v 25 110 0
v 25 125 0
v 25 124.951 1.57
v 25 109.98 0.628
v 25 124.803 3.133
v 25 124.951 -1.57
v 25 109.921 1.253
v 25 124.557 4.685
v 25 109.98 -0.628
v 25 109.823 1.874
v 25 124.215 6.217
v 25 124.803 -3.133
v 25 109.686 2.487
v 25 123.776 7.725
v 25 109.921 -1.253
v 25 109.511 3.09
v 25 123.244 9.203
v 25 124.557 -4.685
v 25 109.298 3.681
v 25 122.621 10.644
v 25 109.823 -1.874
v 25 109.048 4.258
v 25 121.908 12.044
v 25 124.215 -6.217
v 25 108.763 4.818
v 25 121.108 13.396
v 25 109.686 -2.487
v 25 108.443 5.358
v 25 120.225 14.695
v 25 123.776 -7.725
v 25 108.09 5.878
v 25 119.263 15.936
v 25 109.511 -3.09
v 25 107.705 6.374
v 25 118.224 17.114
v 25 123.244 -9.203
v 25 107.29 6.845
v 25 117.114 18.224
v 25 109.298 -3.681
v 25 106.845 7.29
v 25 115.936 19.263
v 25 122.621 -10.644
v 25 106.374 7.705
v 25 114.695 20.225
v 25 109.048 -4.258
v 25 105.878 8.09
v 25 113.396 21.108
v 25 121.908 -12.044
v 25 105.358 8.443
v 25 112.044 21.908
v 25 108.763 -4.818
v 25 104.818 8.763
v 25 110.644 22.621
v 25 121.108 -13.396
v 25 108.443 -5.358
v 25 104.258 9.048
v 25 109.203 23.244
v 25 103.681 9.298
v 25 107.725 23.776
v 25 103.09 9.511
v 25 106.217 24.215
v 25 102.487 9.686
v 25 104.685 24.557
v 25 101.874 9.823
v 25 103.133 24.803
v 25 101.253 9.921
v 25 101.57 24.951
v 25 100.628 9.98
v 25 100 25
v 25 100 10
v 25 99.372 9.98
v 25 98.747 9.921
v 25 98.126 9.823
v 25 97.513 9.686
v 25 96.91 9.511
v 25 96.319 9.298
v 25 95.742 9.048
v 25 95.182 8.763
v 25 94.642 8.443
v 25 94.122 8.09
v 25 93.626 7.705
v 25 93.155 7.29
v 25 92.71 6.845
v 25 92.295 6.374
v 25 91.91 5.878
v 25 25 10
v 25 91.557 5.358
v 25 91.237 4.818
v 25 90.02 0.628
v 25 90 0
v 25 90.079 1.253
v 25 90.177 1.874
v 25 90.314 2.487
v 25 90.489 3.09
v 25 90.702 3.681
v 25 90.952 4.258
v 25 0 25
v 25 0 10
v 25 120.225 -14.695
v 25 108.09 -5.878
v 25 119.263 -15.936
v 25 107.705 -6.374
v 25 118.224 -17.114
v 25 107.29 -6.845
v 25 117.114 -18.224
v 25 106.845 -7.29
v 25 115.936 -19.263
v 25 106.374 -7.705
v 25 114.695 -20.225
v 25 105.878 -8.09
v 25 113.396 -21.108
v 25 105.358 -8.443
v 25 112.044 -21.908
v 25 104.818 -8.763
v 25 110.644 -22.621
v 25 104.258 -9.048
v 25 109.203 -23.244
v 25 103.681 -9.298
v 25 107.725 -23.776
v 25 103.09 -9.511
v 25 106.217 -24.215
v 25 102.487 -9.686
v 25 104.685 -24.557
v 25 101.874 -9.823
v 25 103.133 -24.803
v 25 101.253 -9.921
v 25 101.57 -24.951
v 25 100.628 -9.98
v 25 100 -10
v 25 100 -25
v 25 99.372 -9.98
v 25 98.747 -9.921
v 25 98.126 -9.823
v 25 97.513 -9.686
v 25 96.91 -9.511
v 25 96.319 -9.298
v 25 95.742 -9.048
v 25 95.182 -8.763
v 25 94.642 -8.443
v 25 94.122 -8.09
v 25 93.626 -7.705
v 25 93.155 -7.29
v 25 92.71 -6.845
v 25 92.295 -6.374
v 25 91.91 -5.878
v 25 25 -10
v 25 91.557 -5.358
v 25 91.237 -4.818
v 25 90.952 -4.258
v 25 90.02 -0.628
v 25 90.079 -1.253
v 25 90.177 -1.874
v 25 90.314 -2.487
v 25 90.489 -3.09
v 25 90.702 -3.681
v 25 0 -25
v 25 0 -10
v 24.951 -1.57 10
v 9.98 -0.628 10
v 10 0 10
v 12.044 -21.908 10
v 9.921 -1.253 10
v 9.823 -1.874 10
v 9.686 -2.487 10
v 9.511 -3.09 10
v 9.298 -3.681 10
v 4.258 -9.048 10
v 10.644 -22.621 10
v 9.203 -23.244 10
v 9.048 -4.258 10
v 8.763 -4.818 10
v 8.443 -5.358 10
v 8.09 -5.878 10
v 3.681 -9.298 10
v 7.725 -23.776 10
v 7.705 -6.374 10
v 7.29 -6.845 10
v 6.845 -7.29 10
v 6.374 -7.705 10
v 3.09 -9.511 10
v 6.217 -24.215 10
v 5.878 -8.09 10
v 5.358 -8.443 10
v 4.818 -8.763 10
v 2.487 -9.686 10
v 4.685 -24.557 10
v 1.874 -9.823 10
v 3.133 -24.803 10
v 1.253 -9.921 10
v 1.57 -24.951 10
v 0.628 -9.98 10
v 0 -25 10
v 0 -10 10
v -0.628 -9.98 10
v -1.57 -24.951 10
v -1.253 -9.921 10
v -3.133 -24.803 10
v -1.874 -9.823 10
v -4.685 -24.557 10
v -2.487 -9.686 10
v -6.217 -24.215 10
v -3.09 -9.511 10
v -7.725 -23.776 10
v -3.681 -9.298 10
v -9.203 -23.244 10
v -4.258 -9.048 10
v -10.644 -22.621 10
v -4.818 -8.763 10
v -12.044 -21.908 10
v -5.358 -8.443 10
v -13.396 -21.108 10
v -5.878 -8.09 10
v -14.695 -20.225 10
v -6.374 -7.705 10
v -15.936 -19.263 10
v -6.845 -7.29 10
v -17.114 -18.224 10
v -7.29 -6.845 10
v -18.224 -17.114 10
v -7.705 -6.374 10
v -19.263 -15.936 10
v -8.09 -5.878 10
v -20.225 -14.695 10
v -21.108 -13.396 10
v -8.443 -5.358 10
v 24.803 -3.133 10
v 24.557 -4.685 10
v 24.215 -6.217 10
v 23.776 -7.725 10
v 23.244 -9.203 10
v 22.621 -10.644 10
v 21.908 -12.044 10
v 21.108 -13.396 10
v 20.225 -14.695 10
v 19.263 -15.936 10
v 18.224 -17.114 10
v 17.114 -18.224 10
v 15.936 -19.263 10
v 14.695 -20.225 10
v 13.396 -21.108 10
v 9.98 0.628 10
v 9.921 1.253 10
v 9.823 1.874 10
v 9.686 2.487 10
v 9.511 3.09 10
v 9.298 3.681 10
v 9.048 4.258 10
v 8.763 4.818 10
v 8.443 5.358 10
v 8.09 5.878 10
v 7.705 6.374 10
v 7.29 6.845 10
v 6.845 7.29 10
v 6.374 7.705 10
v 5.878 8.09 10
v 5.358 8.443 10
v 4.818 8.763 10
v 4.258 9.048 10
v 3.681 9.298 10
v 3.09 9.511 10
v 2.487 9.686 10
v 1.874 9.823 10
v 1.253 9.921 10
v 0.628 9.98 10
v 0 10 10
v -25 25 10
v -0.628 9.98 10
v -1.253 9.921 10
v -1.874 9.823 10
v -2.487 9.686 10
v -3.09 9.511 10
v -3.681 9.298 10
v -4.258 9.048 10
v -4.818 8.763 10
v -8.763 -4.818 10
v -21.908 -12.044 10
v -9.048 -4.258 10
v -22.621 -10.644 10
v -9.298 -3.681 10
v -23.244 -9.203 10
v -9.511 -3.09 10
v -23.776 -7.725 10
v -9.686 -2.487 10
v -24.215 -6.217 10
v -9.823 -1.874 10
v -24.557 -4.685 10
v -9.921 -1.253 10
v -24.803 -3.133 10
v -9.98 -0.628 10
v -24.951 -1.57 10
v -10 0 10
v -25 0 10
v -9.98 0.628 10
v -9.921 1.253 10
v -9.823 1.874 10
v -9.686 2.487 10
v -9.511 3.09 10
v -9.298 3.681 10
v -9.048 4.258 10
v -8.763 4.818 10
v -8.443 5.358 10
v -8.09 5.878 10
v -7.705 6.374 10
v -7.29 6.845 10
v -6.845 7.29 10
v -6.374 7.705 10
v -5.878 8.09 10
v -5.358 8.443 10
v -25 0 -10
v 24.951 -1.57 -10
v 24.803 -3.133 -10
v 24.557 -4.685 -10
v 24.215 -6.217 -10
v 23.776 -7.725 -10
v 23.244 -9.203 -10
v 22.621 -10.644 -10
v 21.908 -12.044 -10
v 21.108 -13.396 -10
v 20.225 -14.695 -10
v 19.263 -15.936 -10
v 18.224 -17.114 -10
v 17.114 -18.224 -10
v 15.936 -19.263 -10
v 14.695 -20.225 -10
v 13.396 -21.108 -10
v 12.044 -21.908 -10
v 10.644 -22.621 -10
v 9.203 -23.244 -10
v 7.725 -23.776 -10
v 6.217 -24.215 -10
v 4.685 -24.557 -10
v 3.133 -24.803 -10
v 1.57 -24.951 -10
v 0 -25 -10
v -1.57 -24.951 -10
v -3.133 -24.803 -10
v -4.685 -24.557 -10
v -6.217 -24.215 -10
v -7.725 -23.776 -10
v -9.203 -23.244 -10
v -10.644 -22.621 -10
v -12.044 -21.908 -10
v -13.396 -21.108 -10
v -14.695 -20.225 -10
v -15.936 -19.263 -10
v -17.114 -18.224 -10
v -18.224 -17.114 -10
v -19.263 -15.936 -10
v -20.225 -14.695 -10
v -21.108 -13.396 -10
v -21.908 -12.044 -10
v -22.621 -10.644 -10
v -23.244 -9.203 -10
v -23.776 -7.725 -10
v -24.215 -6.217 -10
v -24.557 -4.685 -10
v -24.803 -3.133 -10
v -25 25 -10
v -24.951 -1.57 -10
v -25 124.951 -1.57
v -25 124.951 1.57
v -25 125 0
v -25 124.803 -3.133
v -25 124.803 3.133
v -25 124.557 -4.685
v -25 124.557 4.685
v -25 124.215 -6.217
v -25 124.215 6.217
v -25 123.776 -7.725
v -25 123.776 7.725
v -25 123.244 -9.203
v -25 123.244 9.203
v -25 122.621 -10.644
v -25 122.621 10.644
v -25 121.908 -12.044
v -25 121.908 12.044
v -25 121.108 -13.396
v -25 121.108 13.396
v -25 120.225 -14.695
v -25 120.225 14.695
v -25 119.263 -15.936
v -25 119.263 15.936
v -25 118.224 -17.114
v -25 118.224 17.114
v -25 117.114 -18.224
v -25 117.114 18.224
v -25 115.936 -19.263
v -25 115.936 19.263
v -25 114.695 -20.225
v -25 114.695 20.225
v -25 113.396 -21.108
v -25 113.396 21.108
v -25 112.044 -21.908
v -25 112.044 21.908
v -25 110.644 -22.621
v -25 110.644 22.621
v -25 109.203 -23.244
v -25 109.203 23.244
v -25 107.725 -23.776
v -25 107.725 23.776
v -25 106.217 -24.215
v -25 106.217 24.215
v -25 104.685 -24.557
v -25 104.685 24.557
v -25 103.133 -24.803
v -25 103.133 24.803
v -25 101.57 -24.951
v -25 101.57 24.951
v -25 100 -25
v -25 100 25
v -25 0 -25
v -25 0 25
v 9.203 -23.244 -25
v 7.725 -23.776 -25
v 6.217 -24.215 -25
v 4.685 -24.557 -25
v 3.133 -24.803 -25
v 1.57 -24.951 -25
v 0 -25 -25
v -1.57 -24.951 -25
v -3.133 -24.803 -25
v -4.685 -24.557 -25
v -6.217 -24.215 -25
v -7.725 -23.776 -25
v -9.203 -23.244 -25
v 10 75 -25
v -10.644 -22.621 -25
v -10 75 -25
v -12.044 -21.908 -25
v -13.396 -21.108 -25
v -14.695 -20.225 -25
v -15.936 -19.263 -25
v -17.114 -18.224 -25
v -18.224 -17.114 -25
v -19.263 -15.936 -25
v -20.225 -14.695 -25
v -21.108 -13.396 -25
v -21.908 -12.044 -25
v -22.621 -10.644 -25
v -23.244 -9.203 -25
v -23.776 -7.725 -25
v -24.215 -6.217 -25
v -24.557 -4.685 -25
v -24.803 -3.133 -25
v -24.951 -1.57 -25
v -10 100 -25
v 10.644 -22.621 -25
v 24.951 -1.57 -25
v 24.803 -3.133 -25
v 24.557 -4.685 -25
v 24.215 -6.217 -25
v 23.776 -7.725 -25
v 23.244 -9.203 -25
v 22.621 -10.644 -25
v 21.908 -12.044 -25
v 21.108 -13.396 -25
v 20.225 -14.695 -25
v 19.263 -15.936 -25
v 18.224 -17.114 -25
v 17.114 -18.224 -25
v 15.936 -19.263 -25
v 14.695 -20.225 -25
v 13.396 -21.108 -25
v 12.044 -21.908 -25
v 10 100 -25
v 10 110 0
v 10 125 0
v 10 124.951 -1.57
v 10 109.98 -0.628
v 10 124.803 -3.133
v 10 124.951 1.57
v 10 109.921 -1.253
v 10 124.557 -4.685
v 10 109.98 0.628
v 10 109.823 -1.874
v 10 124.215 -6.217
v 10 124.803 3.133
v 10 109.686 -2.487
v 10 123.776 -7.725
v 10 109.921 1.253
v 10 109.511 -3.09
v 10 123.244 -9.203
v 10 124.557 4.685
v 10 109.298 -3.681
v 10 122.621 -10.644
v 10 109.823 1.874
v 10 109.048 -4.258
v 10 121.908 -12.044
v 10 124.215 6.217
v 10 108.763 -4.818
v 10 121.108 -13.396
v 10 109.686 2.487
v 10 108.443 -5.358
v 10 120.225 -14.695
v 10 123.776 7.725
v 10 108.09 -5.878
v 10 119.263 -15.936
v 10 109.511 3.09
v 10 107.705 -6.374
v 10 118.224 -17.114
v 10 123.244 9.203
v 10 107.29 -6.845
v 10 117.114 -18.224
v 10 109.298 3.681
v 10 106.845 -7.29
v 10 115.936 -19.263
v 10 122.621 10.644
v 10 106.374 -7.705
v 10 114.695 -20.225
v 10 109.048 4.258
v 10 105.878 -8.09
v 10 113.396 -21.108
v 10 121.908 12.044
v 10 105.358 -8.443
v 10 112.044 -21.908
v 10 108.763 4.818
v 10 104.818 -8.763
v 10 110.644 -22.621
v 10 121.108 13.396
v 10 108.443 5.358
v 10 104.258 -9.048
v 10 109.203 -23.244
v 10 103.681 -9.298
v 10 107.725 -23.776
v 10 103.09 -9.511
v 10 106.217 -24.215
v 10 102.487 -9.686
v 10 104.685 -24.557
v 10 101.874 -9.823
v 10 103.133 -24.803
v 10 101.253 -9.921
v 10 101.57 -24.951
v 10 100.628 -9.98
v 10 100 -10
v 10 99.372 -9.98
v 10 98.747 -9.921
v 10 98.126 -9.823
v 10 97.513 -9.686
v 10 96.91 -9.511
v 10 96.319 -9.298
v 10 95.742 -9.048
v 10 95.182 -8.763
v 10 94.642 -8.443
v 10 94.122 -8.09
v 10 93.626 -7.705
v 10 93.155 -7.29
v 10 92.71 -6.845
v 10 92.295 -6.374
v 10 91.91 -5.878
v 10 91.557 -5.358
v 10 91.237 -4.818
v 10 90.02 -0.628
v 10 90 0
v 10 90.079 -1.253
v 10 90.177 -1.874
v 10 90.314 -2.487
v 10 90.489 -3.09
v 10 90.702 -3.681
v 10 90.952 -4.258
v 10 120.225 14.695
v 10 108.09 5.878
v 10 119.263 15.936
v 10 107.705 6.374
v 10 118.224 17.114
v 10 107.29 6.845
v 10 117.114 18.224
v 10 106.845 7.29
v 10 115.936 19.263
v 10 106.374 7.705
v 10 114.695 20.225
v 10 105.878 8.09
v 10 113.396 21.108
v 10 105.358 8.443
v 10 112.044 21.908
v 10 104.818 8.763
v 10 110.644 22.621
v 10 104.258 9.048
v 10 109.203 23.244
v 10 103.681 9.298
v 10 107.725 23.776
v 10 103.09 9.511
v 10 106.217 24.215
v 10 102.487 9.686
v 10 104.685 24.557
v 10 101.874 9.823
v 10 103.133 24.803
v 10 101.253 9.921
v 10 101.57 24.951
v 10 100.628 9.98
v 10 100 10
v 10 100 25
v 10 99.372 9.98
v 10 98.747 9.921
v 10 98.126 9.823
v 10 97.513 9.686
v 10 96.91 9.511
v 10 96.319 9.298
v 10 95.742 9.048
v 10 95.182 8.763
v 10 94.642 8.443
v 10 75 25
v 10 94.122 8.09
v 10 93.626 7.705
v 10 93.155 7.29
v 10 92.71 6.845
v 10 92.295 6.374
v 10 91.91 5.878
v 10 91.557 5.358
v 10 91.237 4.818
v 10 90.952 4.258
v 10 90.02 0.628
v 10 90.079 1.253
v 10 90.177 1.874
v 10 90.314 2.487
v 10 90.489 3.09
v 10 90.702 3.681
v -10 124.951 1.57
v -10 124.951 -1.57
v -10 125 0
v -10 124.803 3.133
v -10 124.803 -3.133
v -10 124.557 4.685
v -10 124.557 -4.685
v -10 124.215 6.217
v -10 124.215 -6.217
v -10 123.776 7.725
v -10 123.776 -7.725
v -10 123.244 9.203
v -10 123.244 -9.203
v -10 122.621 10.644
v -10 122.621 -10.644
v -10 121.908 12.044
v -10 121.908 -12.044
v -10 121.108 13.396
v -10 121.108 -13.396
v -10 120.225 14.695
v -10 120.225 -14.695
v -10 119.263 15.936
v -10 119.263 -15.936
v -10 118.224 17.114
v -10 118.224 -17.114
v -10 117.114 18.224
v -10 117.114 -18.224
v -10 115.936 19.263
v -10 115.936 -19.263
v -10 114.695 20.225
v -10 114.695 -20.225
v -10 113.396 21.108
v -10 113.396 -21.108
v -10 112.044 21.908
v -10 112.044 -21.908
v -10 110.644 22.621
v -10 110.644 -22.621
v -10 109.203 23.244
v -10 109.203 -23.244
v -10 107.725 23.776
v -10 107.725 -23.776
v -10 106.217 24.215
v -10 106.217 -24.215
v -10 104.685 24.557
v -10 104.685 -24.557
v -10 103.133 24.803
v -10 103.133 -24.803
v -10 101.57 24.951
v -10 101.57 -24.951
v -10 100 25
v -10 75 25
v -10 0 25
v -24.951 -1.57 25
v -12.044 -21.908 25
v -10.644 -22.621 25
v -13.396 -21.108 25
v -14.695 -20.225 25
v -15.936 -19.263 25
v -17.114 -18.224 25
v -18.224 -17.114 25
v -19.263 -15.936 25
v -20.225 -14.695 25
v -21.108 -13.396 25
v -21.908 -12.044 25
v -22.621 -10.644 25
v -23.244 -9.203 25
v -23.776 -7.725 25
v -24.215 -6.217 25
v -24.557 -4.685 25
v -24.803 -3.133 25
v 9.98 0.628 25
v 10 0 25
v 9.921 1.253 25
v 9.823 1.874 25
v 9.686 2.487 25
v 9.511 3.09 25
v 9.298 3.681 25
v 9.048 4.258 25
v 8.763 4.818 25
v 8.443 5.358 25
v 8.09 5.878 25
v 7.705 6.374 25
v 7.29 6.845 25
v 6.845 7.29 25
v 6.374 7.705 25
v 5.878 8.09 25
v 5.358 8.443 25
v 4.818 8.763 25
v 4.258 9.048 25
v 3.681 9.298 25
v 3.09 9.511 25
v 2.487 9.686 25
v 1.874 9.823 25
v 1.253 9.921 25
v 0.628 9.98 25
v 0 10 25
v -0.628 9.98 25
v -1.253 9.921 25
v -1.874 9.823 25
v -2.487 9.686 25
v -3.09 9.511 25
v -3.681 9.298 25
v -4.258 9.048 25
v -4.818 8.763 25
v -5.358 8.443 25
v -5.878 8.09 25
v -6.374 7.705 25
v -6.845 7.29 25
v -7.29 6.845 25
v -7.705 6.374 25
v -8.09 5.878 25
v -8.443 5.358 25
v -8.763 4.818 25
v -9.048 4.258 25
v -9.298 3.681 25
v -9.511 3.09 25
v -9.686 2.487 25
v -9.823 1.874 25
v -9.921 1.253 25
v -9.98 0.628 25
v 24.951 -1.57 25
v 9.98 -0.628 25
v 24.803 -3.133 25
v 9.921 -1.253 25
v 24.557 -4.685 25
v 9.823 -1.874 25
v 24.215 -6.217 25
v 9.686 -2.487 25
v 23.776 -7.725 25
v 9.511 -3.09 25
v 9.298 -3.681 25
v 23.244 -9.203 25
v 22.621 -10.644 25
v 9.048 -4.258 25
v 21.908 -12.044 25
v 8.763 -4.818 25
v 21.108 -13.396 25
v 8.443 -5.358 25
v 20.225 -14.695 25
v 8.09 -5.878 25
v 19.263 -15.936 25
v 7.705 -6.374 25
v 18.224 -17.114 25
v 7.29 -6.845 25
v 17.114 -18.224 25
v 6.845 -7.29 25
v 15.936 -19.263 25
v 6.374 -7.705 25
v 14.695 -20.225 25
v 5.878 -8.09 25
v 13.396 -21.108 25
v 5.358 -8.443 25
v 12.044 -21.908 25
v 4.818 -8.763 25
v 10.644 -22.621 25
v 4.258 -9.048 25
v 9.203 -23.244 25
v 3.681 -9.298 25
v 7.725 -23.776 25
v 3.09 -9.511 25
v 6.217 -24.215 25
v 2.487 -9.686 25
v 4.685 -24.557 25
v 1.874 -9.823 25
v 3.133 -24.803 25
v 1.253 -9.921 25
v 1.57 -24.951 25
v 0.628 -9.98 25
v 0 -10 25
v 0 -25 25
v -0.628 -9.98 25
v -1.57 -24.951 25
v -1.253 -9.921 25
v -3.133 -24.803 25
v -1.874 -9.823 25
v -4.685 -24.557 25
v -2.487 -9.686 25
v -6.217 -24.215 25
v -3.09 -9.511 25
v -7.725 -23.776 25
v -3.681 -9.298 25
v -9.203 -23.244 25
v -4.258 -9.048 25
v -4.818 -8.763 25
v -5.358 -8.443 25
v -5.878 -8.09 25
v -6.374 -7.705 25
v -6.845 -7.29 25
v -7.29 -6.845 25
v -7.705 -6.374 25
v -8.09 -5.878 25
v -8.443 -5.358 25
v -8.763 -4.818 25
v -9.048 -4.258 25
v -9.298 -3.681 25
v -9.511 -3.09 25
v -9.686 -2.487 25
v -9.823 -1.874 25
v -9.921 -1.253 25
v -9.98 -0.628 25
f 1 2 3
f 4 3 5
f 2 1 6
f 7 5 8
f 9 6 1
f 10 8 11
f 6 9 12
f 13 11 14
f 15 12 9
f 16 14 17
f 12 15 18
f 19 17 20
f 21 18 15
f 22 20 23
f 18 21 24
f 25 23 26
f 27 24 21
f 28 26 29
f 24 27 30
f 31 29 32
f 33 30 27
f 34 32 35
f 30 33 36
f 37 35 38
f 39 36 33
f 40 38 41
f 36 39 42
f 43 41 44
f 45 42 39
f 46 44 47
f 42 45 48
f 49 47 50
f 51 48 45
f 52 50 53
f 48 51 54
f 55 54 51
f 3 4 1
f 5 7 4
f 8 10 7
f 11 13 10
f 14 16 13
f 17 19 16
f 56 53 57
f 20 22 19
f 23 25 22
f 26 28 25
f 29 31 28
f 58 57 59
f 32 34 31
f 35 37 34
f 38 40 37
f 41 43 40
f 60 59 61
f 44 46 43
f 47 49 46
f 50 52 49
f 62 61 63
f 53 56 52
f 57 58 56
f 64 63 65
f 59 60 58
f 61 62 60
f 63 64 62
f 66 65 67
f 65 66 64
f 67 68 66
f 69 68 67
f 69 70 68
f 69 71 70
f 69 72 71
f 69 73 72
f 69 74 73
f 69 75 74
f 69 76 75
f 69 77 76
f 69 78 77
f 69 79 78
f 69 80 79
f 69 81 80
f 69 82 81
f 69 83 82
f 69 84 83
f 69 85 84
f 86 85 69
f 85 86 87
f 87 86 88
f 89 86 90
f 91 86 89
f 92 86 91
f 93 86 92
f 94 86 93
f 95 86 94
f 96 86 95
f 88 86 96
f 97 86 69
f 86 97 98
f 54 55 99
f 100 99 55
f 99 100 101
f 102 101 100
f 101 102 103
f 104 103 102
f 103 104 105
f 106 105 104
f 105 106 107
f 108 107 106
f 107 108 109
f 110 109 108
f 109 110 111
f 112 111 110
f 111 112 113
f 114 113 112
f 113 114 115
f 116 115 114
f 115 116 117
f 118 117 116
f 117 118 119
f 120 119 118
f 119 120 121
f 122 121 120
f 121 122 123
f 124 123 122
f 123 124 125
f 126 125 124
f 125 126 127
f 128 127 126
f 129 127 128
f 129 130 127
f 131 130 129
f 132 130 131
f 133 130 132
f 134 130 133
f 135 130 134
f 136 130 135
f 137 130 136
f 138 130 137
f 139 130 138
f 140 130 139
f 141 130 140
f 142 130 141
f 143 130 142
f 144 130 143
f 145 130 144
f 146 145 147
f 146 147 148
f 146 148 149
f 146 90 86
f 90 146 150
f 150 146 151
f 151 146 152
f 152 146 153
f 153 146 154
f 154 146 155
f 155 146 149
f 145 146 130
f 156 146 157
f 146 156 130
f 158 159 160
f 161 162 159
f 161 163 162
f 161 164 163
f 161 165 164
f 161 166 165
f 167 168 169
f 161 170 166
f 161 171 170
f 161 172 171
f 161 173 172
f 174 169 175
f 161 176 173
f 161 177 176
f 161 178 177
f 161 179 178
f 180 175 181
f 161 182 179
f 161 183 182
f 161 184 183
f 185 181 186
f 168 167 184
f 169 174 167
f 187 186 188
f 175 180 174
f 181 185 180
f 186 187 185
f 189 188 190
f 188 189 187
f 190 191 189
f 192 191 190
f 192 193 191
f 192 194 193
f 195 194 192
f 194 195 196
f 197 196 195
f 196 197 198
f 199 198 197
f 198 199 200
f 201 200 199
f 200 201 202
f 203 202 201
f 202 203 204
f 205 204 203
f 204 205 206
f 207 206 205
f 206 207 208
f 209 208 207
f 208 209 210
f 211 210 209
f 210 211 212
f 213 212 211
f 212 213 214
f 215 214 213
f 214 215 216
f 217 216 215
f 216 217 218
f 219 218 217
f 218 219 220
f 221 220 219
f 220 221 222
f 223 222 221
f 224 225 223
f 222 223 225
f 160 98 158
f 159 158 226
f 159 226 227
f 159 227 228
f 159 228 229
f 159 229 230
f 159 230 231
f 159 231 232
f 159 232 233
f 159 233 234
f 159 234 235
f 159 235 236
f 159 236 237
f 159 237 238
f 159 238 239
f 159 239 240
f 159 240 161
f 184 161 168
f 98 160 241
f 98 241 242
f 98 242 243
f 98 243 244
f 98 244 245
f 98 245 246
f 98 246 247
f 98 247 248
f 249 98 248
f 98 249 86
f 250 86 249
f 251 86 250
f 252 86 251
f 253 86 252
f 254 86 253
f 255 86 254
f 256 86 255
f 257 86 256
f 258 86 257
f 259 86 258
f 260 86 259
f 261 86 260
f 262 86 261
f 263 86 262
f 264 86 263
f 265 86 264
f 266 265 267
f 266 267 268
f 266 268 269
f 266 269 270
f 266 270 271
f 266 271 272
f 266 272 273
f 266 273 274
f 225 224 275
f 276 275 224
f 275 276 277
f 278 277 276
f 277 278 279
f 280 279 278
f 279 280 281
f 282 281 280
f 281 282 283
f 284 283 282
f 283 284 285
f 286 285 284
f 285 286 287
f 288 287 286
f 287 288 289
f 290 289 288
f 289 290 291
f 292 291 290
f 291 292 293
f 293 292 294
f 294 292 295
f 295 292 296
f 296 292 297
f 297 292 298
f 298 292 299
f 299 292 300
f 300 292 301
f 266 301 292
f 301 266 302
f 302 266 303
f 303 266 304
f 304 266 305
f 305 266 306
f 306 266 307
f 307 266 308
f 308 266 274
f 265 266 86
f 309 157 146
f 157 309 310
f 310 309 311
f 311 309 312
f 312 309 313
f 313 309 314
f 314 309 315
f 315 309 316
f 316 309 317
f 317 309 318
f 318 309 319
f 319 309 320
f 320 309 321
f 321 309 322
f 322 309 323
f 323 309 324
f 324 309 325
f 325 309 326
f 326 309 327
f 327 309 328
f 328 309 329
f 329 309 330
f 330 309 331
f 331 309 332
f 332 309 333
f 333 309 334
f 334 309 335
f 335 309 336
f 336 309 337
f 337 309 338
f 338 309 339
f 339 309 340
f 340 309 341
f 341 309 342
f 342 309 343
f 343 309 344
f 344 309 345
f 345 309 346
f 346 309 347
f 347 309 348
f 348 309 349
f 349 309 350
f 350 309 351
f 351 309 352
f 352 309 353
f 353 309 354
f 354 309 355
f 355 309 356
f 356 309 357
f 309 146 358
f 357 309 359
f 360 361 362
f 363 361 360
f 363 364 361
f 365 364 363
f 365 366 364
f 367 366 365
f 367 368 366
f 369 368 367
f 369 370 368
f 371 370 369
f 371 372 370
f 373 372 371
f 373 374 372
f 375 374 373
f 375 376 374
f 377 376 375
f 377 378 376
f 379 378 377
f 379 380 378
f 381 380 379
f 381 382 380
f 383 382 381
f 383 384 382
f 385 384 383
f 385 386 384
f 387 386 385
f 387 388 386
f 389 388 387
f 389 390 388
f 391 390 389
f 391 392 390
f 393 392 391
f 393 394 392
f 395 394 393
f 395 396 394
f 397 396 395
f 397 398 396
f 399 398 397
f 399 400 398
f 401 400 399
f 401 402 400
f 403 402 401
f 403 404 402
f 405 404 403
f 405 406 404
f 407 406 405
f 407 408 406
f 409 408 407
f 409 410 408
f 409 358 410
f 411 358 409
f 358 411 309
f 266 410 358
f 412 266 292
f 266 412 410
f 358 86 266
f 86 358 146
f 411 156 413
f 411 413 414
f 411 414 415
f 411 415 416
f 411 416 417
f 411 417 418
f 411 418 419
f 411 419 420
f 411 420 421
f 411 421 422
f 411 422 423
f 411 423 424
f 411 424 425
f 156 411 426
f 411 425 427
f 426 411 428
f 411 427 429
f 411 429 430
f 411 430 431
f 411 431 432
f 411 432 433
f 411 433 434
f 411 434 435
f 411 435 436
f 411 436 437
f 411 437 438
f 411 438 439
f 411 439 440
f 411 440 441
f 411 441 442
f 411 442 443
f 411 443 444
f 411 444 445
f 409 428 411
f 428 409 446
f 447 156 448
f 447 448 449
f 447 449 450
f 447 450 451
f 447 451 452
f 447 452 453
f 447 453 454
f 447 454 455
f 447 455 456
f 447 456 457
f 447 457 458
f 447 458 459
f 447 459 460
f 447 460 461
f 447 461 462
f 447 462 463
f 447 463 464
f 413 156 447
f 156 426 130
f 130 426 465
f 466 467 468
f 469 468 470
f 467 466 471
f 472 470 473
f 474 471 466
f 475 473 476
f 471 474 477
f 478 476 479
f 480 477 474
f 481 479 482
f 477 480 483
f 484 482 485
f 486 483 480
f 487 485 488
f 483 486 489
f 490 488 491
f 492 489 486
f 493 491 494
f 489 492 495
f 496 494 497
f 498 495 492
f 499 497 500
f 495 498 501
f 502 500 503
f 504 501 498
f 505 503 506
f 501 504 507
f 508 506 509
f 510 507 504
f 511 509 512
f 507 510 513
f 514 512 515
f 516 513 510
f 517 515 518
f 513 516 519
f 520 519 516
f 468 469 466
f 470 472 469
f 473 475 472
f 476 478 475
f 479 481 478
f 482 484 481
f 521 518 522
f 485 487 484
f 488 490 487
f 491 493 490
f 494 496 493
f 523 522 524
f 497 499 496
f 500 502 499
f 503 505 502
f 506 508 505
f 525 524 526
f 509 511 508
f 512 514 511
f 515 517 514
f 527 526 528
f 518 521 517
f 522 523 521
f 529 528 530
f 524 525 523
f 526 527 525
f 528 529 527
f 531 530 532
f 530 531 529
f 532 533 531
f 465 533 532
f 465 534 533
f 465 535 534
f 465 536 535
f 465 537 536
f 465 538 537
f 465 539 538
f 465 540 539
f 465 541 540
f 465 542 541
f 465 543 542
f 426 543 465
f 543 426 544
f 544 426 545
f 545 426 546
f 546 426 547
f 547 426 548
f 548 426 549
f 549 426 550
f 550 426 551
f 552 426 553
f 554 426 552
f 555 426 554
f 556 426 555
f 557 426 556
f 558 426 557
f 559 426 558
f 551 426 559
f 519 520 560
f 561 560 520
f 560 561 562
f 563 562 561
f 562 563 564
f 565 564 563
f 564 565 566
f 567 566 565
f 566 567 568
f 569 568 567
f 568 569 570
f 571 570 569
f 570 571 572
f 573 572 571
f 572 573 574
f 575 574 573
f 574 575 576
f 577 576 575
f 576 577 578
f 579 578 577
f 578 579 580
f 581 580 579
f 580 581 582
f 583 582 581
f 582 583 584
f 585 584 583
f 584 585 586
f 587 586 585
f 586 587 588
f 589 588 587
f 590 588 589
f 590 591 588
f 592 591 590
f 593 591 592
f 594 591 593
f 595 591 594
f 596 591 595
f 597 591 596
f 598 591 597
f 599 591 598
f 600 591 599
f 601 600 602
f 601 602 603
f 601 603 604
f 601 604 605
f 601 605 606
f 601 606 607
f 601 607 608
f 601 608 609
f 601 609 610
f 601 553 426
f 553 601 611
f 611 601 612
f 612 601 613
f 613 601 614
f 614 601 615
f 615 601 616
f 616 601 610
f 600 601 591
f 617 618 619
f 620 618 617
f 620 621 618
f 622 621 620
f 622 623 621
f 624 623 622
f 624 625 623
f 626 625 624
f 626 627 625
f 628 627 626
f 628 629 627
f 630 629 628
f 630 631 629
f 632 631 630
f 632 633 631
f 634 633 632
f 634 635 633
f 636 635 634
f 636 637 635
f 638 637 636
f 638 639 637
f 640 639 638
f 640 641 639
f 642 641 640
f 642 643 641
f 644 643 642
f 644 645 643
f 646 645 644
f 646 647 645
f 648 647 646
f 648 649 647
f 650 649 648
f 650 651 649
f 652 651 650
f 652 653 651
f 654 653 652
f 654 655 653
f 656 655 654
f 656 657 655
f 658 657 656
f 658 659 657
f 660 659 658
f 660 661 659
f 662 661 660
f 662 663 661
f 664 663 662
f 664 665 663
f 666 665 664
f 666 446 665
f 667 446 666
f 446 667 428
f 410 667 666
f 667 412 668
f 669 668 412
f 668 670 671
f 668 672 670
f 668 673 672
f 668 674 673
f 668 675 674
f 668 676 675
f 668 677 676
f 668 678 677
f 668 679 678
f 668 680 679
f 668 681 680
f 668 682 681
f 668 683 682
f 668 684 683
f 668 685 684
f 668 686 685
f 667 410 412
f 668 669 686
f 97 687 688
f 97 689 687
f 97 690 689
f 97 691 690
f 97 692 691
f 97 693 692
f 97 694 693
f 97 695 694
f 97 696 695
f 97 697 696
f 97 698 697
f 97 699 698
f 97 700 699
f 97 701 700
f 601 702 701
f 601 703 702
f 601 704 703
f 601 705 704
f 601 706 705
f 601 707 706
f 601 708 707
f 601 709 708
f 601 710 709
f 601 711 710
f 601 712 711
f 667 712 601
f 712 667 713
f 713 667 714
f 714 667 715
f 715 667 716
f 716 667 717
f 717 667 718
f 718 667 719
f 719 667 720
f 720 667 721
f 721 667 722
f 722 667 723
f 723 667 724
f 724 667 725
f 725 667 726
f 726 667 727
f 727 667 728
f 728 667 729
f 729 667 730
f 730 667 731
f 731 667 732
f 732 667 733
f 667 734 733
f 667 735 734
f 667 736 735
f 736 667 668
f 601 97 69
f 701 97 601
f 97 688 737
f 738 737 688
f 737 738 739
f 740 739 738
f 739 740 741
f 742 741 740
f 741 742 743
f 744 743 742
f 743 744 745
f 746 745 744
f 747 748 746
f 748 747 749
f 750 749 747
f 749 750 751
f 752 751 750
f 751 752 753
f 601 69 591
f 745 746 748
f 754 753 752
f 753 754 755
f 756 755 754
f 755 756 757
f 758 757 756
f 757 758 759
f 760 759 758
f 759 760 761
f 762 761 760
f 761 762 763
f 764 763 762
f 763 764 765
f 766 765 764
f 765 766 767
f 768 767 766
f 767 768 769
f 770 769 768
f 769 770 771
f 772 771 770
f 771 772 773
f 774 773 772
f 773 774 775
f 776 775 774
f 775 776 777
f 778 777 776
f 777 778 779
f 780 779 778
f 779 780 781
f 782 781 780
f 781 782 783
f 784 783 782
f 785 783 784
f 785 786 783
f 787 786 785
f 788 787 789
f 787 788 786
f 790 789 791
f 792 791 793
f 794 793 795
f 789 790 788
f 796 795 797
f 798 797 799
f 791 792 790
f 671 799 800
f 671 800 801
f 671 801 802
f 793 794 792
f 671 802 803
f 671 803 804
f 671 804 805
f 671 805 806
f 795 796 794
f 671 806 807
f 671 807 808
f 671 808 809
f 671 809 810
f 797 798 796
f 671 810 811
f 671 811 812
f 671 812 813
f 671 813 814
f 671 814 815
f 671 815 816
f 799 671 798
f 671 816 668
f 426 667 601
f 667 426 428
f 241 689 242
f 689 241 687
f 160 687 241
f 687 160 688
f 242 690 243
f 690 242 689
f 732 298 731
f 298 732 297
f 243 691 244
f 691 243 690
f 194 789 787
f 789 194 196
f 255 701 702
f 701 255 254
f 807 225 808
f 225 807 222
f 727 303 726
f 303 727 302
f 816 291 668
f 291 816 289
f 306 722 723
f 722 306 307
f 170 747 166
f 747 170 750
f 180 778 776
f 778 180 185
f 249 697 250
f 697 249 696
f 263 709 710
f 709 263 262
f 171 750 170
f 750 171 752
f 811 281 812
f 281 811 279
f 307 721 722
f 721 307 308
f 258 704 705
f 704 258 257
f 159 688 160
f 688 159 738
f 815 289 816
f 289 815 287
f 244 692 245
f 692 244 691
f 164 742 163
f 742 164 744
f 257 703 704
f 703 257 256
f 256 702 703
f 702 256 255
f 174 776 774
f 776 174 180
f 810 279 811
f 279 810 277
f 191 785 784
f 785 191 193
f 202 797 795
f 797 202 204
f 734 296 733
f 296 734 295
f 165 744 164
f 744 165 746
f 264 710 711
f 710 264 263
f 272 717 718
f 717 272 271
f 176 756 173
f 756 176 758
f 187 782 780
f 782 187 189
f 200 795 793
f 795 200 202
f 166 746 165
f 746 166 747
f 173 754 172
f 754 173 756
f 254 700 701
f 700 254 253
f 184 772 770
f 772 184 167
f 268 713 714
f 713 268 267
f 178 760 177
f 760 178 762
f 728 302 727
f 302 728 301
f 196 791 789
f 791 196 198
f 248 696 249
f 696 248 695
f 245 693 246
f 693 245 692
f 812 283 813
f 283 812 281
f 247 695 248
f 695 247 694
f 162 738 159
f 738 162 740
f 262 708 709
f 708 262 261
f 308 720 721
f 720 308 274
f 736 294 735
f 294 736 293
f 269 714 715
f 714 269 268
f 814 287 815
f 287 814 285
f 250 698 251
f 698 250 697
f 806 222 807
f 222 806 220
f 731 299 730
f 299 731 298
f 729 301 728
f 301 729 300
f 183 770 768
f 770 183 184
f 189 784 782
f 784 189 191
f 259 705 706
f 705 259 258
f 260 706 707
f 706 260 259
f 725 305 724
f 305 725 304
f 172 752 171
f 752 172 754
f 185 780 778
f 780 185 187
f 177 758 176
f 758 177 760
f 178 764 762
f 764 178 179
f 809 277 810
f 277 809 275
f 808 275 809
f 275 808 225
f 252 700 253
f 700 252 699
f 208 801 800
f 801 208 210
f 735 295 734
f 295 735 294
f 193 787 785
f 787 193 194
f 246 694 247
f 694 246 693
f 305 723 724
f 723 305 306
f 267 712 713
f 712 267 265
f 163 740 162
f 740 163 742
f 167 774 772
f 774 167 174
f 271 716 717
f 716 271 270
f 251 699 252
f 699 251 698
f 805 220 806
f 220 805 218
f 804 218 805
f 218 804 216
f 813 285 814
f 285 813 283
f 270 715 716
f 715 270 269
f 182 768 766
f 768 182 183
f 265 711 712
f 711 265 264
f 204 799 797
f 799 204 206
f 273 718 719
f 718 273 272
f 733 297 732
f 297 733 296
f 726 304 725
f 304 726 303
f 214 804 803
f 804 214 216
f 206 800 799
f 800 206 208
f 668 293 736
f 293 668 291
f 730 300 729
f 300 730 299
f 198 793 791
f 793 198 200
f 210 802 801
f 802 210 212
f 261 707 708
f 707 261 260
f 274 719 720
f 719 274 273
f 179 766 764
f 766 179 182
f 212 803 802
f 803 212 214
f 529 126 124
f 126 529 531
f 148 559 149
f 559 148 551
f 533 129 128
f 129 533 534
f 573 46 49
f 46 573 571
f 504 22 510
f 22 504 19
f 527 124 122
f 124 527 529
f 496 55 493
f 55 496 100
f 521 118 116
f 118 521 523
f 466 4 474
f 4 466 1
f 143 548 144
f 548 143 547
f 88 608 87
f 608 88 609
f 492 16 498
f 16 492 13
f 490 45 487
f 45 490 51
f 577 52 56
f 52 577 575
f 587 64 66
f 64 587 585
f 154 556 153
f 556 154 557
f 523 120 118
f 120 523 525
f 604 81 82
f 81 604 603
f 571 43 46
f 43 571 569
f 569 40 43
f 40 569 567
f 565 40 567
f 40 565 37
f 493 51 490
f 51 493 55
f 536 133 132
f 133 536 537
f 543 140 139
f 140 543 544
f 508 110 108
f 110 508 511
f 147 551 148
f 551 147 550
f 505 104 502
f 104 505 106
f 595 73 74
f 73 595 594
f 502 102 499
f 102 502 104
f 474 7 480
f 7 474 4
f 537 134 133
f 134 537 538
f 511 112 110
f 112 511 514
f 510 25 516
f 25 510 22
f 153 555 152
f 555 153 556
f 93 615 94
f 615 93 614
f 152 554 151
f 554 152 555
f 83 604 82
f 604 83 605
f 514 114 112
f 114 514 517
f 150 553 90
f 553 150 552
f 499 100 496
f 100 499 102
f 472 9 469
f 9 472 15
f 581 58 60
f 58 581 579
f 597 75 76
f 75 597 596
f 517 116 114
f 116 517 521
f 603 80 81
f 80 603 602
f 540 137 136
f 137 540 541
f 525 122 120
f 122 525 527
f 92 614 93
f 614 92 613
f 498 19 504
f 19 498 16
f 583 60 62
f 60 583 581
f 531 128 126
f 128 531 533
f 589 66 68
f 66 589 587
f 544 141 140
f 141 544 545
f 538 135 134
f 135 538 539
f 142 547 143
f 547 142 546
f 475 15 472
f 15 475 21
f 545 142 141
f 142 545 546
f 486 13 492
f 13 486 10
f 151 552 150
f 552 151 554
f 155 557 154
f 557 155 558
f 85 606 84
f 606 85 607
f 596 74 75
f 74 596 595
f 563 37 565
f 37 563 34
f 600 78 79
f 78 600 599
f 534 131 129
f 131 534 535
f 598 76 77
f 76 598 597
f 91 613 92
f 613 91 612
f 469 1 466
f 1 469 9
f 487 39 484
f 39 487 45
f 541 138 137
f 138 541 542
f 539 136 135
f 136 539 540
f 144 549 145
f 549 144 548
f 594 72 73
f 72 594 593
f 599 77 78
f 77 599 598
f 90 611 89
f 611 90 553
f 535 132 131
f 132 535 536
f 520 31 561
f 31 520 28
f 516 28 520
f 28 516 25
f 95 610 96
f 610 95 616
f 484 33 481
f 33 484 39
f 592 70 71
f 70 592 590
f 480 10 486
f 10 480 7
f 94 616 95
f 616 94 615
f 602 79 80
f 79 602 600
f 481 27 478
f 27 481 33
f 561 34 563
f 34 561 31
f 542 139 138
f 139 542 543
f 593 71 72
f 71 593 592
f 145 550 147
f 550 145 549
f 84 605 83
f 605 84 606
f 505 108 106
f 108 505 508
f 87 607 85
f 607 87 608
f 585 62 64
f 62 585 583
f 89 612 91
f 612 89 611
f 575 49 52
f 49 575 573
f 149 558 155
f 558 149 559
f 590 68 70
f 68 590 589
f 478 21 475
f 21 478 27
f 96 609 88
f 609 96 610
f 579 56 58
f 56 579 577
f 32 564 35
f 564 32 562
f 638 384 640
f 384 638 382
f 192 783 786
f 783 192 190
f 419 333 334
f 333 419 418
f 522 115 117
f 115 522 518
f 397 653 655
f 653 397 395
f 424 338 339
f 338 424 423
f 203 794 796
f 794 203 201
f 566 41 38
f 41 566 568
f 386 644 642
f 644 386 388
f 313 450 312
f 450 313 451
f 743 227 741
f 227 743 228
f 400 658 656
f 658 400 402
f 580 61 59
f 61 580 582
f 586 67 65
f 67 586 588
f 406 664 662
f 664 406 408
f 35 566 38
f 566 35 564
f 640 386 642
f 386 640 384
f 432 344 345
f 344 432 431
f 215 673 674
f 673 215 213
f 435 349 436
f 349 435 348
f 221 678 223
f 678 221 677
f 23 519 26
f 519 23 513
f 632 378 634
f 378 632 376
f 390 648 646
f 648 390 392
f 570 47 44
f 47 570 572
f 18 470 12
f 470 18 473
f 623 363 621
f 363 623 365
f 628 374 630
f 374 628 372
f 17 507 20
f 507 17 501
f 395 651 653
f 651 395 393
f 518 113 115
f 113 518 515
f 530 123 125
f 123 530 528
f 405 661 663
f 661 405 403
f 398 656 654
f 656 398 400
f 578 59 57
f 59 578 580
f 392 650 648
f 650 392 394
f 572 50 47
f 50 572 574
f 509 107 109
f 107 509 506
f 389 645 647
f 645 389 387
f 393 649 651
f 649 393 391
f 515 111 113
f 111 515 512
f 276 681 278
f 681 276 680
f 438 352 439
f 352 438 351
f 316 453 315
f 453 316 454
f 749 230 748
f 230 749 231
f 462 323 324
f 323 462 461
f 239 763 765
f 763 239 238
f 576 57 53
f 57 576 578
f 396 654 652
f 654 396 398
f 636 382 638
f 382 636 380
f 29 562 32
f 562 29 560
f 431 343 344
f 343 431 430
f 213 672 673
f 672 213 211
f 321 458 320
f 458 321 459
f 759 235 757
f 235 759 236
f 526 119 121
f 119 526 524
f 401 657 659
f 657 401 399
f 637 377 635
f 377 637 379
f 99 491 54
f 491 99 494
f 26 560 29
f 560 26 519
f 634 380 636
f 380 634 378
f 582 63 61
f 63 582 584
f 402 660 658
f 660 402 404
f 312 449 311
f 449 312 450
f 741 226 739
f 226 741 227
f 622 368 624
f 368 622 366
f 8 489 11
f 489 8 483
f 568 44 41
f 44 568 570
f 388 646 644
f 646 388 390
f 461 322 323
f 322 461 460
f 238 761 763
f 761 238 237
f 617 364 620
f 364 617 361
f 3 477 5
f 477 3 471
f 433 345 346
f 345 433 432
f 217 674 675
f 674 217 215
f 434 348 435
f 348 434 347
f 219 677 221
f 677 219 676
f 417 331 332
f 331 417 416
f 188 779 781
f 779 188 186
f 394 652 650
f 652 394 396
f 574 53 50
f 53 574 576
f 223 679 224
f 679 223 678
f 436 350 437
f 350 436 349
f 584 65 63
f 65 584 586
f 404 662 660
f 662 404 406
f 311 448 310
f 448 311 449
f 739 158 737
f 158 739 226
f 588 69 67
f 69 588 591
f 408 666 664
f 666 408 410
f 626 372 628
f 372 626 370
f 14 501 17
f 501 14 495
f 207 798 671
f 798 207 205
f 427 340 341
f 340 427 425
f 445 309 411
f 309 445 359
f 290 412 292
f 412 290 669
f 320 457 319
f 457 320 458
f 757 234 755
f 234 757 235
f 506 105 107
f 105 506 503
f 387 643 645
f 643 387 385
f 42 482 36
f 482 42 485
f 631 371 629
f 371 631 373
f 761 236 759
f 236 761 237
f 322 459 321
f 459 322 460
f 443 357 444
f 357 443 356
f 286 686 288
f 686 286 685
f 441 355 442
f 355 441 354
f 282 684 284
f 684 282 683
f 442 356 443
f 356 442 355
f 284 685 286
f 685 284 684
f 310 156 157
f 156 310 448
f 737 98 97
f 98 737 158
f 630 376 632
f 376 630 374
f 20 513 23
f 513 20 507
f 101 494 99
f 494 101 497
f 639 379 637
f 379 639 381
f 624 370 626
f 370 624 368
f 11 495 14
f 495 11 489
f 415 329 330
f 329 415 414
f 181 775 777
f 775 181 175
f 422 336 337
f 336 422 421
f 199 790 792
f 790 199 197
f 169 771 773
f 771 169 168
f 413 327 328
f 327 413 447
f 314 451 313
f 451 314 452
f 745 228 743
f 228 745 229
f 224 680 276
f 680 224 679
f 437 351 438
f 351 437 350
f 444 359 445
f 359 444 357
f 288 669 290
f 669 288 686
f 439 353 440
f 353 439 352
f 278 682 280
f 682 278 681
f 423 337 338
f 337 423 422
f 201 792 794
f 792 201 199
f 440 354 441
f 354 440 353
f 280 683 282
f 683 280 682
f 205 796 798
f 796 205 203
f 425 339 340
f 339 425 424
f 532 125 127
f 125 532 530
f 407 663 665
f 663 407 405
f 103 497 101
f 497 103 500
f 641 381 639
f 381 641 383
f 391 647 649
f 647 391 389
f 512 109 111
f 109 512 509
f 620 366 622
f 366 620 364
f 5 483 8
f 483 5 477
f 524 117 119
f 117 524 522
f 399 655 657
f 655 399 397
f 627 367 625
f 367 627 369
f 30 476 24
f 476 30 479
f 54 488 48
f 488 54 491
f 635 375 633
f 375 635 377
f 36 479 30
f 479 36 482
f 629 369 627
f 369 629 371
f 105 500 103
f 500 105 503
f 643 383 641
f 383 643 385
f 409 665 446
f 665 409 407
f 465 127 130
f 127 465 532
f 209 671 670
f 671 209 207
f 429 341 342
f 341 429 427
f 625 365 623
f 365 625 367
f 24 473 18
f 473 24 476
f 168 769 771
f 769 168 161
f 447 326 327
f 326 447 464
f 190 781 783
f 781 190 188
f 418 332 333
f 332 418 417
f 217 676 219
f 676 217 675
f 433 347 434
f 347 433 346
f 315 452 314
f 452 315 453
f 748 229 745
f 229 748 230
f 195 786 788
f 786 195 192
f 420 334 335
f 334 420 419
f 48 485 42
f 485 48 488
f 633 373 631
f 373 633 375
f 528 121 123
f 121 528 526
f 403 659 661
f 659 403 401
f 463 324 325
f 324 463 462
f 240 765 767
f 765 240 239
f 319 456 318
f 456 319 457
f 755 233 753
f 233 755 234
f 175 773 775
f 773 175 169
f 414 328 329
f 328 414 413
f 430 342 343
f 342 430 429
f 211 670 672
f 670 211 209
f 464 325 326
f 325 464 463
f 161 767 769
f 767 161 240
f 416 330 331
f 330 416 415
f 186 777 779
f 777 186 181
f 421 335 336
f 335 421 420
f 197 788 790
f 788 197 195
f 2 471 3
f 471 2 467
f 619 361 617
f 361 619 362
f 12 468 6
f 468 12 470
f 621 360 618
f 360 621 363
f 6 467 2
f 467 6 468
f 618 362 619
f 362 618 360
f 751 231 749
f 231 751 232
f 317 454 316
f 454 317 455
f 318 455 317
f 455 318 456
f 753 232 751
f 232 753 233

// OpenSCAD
// file: ../lib.scad
/*
 * Sum all of the elements in a vector.
 */
function sum(x, i = 0) =
     len(x) <= i?0:
     x[i]+sum(x, i + 1);

/*
 * Pop one element off of the front of a list.
 */
function pop(list) =
     assert(len(list)>0)
     len(list)==1?[]:
     [for(i=[1:len(list)-1])
	       list[i]];

/*
 * Return the requrested number of elements off of the front of a list.
 */
// TODO: Take negitive for off of the back.
function take(count,list) =
     count==0?[]:
     [for(i=[0:count-1])
	  if(i>=len(list))
	       undef
	  else
	       list[i]];

/*
 * Count the number of non-undef elements of a list.
 */
function count_defined(list) =
     sum([
      for (e=list)
	   if(e!=undef)
	      1]);
/*
 * Return the first non-undef element, if there is one.
 */
// TODO: This may be faster to return early in the case of large
// lists, how large?
function any(list) =
     [for(e=list)
	 if(e!=undef)
	    e
     ][0];
/*
 * Assert that exactly one element is non-undef and return it.
 */
function unique(list,message="") =
     assert(count_defined(list)==1,message)
     any(list);


X=[1,0,0];
Y=[0,1,0];
Z=[0,0,1];

/*
 * Glue each child onto the outside of the priors.
 *
 * TODO: The outside is currently defined by =hull= and this isn't
 * best.
 *
 * TODO: Make a better name.
 */
module outer_glue()
     for(c=[0:$children-1])
	  difference(){
	       children(c);
	       if(c!=0)
		    for(co=[0:c-1])
			 hull()
			      children(co);}


// This doesn't work because children aren't connected.

module outer_hull(){
     outer_glue(){
	  children();}
     difference(){
	  hull(){
	       outer_glue(){
		    children();}}
	  for(c=[0:$children-1]){
	       hull(){
		    children(c);}}}}



/*
 * Make a pair of an object.
 *
 * @param split The distance to separate the pair.
 *        radius
 *        diameter
 *        r
 *        d
 *
 * @param rot An optional amount to rotate the pair.
 *        theta
 *
 * @param edge Center on the left of the pair rather than the middle.
 *
 * @param mirrored Make the left a mirror of the right instead of a
 *                rotation.
 * @param center The refrence locaiton for the pair.
 */
module pair(split,rot,edge=false,mirrored=true,
     radius,r,diameter,d,theta,center){
     rad=unique([split/2,radius,r,diameter,d/2],
		"Distance required.");
     angle=any([rot,theta,0]);
     module center(){
	  if(edge){
	       translate([abs(rad),0,0]){
		    children();}}
	  else{
	       children();}}
     module flip(){
	  if(mirrored){
	       mirror([1,0,0]){
		    children();}}
	  else{
	       rotate([0,0,180]){
		    children();}}}
     if(center!=undef){
	  translate(center){
	       pair(split,rad,theta=theta){
		    translate(-center){
			 children();}}}}
     else{
	  rotate([0,0,angle]){
	       center(){
		    translate([rad,0,0]){
			 children();}
		    translate([-rad,0,0]){
			 flip(){
			      children();}}}}}}

module xpair(split,rot=0,edge=false){
     pair(split,rot,edge){
	  children();}}
module ypair(split,rot=0,edge=false){
     rotate(90){
	  pair(split,rot,edge){
	       rotate(-90){
		    children();}}}}

module zpair(split,rot=0,edge=false){
     rotate(-90*Y){
	  pair(split,rot,edge){
	       rotate(90*Y){
		    children();}}}}

/*
 * Make a pair but with a middle element.
 *
 * @param split The distance to separate the pair.
 *
 * @param rot An optional amount to rotate the pair.
 */
module tripple(split,rot=0){
     rotate([0,0,90]){
	  children();}
     pair(split,rot){
	  children();}}
/*
 * Make a set of objects in a circle.
 *
 * @param count The number of elements in the circle
 *
 * @param r The radius of the circle.
 */
module set(count,radius,
	   c,r,diameter,d){
     cnt=unique([count,c],
		"Count required.");
     rad=unique([radius,r,diameter/2,d/2],
		"Radius required.");
     for(i=[0:cnt]){
	  rotate([0,0,360/cnt*i]){
	       translate([rad,0,0]){
		    children();}}}}

module grid(directions,times=[2,2]){
     module itter(d,t){
     for(i=[0:t]){
	  translate(d*i){
	       children();}}}
     if(len(directions)==1){
	  itter(directions[0],times[0])children();}
	  else{
	       itter(directions[0],times[0]){
		    grid(pop(directions),pop(times)){
			 children();}}}}

/*
 * A quick rename of translate along z.
 *
 * @param distance The distance to lift by.
 */
function _move(distance)=
     unique([distance],"Distance required.");
function up(distance)=
     _move(distance)*Z;
function down(distance)=
     _move(-distance)*Z;
function right(distance)=
     _move(distance)*Y;
function left(distance)=
     _move(-distance)*Y;
function forward(distance)=
     _move(distance)*X;
function back(distance)=
     _move(-distance)*X;

/*
 * A copy of =cylinder= that is slightly taller so that =difference=
 * doesn't cause graphical glitches.
 */
module wcylinder(h,r,r1,r2,d,d1,d2,center){
     fix_delta=1;
     if(h<0){
	  mirror(Z){
	       wcylinder(h=-h,
			r=r,r1=r1,r2=r2,
			d=d,d1=d1,d2=d2);}}
     else if(center){
	  cylinder(h=h+fix_delta,
		   r=r,r1=r1,r2=r2,
		   d=d,d1=d1,d2=d2,
		   center=true);}
     else{
	  translate(down(fix_delta)){
	       cylinder(h=h+2*fix_delta,
			r=r,r1=r1,r2=r2,
			d=d,d1=d1,d2=d2);}}}

module Cube(size,center=[0,0,0]){
     s=unique([size],"Size required.");
     if(center==true){
	  Cube(s,X+Y+Z);}
     else if(center==false){
	  Cube(s);}
     else if(len(s)==undef){
	  Cube([s,s,s],center);}
     else{
	  if(s[0]<0){
	       assert(center==false || center[0]==0,
		    "Can't center and flip along the same axis.");
	       translate(X*s[0]){
		    Cube([-s[0],s[1],s[2]],center);}}
	  else if(s[1]<0){
	       assert(center==false || center[1]==0,
		      "Can't center and flip along the same axis.");
	       translate(Y*s[1]){
		    Cube([s[0],-s[1],s[2]],center);}}
	  else if(s[2]<0){
	       assert(center==false || center[2]==0,
		      "Can't center and flip along the same axis.");
	       translate(Z*s[2]){
		    Cube([s[0],s[1],-s[2]],center);}}
	  else translate([for(i=[0:2])-1/2*s[i]*center[i]]){
		    cube(s);}}}

/*
 * Mirror the children around a plane.
 */
module Mirror(normalVector,radius=0){
     translate(radius*normalVector){
	  mirror(normalVector){
	       translate(-radius*normalVector){
		    children();}}}}

/*
 * Make a parallelepiped out of three three-vectors.
 */
module parallelepiped(v1,v2,v3)
     hull() // Not sure why this is needed.
	  polyhedron([0*v1,v1,v1+v2,v2,v3,v3+v1,v3+v1+v2,v3+v2],
		     [[0,1,2,3],[4,5,6,7],[0,1,5,4],
		      [3,2,6,7],[0,3,7,4],[1,5,6,2]]);

/*
 * An annulus.
 *
 * @param outer_radius The outer radius.
 *        radius_outer
 *        ro
 *        od
 *
 * @param inner_radius The inner radius.
 *        radius_inner
 *        ri
 *        id
 *
 * @param thickness The height of the annulus.
 *        height
 *        t
 *        h
 *
 * @param center TODO
 *
 * @param theta An optional angle of exclusion.
 *              TODO: Have an inclusion mode.
 *
 * @param cut_tangent If the cut should be tangent to the center cut
 *                    instead of radial.  NOTE: If this is specified
 *                    but theta is not then the internal radius is
 *                    used.
 *
 * @param cut_symmetric If the cut should be symmetric about the X axis.
 */

// TODO: have an optional 2D child to shape the annulus's profile,
// this is in conflict with the radial parameters, as they define the
// shape.
// TODO: Take an opptional second center and make a slot.
module annulus(outer_radius,inner_radius,height,
	       radius_outer,radius_inner,
	       or,ro,od,ir,ri,id,h,thickness,t,center=false,
	       theta,cut_tangent=false,cut_symmetric=false){
     rad_out=unique([outer_radius,radius_outer,or,ro,od/2],
		    "Outer radius required.");
     rad_in=unique([inner_radius,radius_inner,ir,ri,id/2],
		   "Inner radius required.");
     hei=unique([height,h,thickness,t],
		"Height required.");

     module cutter(t,sym=true){
	  if(t>180){
	       assert(cut_tangent==false,
		      "Tangent cuts currently can't be over 180 degrees.");}
	  if(sym && cut_symmetric){
	       cutter(t/2,false);
	       mirror([0,1,0]){
		    cutter(t/2,false);}}
	  else if(t>90){
	       cutter(90,false);
	       rotate(90){
		    cutter(t-90,false);}}
	  else{
	       if(center){
		    translate(down(hei/2)){
			 parallelepiped(hei*[0,0,1],
					rad_out*[1,0,0],
					rad_out*[cos(t),sin(t),0]);}}
	       else{
		    parallelepiped(hei*[0,0,1],
				   rad_out*[1,0,0],
				   rad_out*[cos(t),sin(t),0]);}}}
     // If cut_tangent but no theta, then use the internal radius.
     if((cut_tangent) && (theta==undef)){
	  annulus(ro=rad_out,ri=rad_in,h=hei,center=center,
		  theta=2*asin(rad_in/rad_out),
		  cut_tangent=true,
		  cut_symmetric=cut_symmetric);}
     else if(theta!=undef){
	  difference(){
	       annulus(ro=rad_out,ri=rad_in,h=hei,center=center);
	       if(cut_tangent){
		    hull(){
			 wcylinder(r=rad_in,h=hei,center=center);
			 intersection(){
			      cutter(theta);
			      cylinder(r=rad_out,h=hei,center=center);}}
	       }
	       else{
		    cutter(theta);}}}
     else if(rad_in<0){
	  difference(){
	       cylinder(r=rad_out,h=hei,center=center);
	       wcylinder(r=rad_out+rad_in,h=hei,center=center);}}
     else{
	  difference(){
	       cylinder(r=rad_out,h=hei,center=center);
	       wcylinder(r=rad_in,h=hei,center=center);}}}

/*
 * A rectangle with a circular end.
 *
 * TODO: remake as outer_glue and annulus.
 */
module arch(radius,height,thickness,
	    r,h,t,
	    window_radius,w,ri,
     bottom_edge=false){
     rad=unique([radius,r],
		"Radius required.");
     hei=unique([height,h],
		"Height required.");
     th=unique([thickness,t],
	       "Thickness required.");
     wi=any([window_radius,w,ri]);
     module flip(){
	  if(bottom_edge){
	       translate((hei-rad)*X){
		    rotate(180*Z){
			 children();}}}
	  else{
	       children();}}
     flip(){
	  if(wi){
	       if(wi<0){
		    arch(r=rad,h=hei,t=th,w=r-wi);}
	       else{
		    difference(){
			 arch(r=rad,h=hei,t=th);
			 wcylinder(r=wi,h=th);}}}
	  else{
	       cylinder(r=rad,h=th);
	       translate([0,-rad,0]){
		    cube([hei-rad,2*rad,th]);}}}}


module ramp(length,height,width){
     // assert numbers
     polyhedron([[0,0,0],[length,0,0],[0,0,height],
		 [0,width,0],[length,width,0],[0,width,height]],
		[[2,1,0],[3,4,5],[0,1,4,3],[0,3,5,2],[1,2,5,4]]);}

/*
 * This is an experimental section for dealing with 2d objects
 */
module Square(size,center){
}

module thin(){
     linear_extrude(1/$fn){
	  children();}}

module CircleT(r){
     thin(){
	  circle(r);}}

module loft(){
     for(c=[0:$children-2]){
	  hull(){
	       children(c);
	       children(c+1);}}}

module camshaft(list){
     // assert (len(list)-1)%2=0,"Invalid camshaft.");
     if(len(list)>3){
	  translate(list[1]){
	       camshaft(pop(pop(list)));}
	  camshaft(take(3,list));}
     else if(len(list)==3){
	  //assert [0,2] numbers
	  assert(len(list[1])==3,"Invalid offset.");
	  // TODO: let the faces be more than circles?
	  //       Shapes can't be parameters
	  if(list[1]!=[0,0,0]){ // clip out empty spacers
	       loft(){
		    CircleT(list[0]);
		    translate(list[1]){
			 CircleT(list[2]);}}}}
     else{
	  assert(false,"That's just a cylinder.");}}
// main file
$fn=100;
mm=1; // define units
degrees=1;

use <../lib.scad>;

module example_103(){
     inter_cylinder_distance=100*mm;
     side_length=50*mm;
     module both_sides(){
	  children();
	  translate([0,inter_cylinder_distance,0]){
		    rotate([0,90,0]){
			 children();}}}
     module shell(){
	  hull(){
	       both_sides(){
		    cylinder(r=side_length/2,h=side_length,center=true);}}}
     module slots(){
	  slot_height=20*mm;
	  both_sides(){
	       cube([side_length,side_length,slot_height],center=true);}
     }
     module pins(){
	  pin_radius=10*mm;
	  both_sides(){
	       cylinder(r=pin_radius,h=inter_cylinder_distance);}}
     difference(){
	  shell();
	  slots();
	  pins();}
}

example_103();
